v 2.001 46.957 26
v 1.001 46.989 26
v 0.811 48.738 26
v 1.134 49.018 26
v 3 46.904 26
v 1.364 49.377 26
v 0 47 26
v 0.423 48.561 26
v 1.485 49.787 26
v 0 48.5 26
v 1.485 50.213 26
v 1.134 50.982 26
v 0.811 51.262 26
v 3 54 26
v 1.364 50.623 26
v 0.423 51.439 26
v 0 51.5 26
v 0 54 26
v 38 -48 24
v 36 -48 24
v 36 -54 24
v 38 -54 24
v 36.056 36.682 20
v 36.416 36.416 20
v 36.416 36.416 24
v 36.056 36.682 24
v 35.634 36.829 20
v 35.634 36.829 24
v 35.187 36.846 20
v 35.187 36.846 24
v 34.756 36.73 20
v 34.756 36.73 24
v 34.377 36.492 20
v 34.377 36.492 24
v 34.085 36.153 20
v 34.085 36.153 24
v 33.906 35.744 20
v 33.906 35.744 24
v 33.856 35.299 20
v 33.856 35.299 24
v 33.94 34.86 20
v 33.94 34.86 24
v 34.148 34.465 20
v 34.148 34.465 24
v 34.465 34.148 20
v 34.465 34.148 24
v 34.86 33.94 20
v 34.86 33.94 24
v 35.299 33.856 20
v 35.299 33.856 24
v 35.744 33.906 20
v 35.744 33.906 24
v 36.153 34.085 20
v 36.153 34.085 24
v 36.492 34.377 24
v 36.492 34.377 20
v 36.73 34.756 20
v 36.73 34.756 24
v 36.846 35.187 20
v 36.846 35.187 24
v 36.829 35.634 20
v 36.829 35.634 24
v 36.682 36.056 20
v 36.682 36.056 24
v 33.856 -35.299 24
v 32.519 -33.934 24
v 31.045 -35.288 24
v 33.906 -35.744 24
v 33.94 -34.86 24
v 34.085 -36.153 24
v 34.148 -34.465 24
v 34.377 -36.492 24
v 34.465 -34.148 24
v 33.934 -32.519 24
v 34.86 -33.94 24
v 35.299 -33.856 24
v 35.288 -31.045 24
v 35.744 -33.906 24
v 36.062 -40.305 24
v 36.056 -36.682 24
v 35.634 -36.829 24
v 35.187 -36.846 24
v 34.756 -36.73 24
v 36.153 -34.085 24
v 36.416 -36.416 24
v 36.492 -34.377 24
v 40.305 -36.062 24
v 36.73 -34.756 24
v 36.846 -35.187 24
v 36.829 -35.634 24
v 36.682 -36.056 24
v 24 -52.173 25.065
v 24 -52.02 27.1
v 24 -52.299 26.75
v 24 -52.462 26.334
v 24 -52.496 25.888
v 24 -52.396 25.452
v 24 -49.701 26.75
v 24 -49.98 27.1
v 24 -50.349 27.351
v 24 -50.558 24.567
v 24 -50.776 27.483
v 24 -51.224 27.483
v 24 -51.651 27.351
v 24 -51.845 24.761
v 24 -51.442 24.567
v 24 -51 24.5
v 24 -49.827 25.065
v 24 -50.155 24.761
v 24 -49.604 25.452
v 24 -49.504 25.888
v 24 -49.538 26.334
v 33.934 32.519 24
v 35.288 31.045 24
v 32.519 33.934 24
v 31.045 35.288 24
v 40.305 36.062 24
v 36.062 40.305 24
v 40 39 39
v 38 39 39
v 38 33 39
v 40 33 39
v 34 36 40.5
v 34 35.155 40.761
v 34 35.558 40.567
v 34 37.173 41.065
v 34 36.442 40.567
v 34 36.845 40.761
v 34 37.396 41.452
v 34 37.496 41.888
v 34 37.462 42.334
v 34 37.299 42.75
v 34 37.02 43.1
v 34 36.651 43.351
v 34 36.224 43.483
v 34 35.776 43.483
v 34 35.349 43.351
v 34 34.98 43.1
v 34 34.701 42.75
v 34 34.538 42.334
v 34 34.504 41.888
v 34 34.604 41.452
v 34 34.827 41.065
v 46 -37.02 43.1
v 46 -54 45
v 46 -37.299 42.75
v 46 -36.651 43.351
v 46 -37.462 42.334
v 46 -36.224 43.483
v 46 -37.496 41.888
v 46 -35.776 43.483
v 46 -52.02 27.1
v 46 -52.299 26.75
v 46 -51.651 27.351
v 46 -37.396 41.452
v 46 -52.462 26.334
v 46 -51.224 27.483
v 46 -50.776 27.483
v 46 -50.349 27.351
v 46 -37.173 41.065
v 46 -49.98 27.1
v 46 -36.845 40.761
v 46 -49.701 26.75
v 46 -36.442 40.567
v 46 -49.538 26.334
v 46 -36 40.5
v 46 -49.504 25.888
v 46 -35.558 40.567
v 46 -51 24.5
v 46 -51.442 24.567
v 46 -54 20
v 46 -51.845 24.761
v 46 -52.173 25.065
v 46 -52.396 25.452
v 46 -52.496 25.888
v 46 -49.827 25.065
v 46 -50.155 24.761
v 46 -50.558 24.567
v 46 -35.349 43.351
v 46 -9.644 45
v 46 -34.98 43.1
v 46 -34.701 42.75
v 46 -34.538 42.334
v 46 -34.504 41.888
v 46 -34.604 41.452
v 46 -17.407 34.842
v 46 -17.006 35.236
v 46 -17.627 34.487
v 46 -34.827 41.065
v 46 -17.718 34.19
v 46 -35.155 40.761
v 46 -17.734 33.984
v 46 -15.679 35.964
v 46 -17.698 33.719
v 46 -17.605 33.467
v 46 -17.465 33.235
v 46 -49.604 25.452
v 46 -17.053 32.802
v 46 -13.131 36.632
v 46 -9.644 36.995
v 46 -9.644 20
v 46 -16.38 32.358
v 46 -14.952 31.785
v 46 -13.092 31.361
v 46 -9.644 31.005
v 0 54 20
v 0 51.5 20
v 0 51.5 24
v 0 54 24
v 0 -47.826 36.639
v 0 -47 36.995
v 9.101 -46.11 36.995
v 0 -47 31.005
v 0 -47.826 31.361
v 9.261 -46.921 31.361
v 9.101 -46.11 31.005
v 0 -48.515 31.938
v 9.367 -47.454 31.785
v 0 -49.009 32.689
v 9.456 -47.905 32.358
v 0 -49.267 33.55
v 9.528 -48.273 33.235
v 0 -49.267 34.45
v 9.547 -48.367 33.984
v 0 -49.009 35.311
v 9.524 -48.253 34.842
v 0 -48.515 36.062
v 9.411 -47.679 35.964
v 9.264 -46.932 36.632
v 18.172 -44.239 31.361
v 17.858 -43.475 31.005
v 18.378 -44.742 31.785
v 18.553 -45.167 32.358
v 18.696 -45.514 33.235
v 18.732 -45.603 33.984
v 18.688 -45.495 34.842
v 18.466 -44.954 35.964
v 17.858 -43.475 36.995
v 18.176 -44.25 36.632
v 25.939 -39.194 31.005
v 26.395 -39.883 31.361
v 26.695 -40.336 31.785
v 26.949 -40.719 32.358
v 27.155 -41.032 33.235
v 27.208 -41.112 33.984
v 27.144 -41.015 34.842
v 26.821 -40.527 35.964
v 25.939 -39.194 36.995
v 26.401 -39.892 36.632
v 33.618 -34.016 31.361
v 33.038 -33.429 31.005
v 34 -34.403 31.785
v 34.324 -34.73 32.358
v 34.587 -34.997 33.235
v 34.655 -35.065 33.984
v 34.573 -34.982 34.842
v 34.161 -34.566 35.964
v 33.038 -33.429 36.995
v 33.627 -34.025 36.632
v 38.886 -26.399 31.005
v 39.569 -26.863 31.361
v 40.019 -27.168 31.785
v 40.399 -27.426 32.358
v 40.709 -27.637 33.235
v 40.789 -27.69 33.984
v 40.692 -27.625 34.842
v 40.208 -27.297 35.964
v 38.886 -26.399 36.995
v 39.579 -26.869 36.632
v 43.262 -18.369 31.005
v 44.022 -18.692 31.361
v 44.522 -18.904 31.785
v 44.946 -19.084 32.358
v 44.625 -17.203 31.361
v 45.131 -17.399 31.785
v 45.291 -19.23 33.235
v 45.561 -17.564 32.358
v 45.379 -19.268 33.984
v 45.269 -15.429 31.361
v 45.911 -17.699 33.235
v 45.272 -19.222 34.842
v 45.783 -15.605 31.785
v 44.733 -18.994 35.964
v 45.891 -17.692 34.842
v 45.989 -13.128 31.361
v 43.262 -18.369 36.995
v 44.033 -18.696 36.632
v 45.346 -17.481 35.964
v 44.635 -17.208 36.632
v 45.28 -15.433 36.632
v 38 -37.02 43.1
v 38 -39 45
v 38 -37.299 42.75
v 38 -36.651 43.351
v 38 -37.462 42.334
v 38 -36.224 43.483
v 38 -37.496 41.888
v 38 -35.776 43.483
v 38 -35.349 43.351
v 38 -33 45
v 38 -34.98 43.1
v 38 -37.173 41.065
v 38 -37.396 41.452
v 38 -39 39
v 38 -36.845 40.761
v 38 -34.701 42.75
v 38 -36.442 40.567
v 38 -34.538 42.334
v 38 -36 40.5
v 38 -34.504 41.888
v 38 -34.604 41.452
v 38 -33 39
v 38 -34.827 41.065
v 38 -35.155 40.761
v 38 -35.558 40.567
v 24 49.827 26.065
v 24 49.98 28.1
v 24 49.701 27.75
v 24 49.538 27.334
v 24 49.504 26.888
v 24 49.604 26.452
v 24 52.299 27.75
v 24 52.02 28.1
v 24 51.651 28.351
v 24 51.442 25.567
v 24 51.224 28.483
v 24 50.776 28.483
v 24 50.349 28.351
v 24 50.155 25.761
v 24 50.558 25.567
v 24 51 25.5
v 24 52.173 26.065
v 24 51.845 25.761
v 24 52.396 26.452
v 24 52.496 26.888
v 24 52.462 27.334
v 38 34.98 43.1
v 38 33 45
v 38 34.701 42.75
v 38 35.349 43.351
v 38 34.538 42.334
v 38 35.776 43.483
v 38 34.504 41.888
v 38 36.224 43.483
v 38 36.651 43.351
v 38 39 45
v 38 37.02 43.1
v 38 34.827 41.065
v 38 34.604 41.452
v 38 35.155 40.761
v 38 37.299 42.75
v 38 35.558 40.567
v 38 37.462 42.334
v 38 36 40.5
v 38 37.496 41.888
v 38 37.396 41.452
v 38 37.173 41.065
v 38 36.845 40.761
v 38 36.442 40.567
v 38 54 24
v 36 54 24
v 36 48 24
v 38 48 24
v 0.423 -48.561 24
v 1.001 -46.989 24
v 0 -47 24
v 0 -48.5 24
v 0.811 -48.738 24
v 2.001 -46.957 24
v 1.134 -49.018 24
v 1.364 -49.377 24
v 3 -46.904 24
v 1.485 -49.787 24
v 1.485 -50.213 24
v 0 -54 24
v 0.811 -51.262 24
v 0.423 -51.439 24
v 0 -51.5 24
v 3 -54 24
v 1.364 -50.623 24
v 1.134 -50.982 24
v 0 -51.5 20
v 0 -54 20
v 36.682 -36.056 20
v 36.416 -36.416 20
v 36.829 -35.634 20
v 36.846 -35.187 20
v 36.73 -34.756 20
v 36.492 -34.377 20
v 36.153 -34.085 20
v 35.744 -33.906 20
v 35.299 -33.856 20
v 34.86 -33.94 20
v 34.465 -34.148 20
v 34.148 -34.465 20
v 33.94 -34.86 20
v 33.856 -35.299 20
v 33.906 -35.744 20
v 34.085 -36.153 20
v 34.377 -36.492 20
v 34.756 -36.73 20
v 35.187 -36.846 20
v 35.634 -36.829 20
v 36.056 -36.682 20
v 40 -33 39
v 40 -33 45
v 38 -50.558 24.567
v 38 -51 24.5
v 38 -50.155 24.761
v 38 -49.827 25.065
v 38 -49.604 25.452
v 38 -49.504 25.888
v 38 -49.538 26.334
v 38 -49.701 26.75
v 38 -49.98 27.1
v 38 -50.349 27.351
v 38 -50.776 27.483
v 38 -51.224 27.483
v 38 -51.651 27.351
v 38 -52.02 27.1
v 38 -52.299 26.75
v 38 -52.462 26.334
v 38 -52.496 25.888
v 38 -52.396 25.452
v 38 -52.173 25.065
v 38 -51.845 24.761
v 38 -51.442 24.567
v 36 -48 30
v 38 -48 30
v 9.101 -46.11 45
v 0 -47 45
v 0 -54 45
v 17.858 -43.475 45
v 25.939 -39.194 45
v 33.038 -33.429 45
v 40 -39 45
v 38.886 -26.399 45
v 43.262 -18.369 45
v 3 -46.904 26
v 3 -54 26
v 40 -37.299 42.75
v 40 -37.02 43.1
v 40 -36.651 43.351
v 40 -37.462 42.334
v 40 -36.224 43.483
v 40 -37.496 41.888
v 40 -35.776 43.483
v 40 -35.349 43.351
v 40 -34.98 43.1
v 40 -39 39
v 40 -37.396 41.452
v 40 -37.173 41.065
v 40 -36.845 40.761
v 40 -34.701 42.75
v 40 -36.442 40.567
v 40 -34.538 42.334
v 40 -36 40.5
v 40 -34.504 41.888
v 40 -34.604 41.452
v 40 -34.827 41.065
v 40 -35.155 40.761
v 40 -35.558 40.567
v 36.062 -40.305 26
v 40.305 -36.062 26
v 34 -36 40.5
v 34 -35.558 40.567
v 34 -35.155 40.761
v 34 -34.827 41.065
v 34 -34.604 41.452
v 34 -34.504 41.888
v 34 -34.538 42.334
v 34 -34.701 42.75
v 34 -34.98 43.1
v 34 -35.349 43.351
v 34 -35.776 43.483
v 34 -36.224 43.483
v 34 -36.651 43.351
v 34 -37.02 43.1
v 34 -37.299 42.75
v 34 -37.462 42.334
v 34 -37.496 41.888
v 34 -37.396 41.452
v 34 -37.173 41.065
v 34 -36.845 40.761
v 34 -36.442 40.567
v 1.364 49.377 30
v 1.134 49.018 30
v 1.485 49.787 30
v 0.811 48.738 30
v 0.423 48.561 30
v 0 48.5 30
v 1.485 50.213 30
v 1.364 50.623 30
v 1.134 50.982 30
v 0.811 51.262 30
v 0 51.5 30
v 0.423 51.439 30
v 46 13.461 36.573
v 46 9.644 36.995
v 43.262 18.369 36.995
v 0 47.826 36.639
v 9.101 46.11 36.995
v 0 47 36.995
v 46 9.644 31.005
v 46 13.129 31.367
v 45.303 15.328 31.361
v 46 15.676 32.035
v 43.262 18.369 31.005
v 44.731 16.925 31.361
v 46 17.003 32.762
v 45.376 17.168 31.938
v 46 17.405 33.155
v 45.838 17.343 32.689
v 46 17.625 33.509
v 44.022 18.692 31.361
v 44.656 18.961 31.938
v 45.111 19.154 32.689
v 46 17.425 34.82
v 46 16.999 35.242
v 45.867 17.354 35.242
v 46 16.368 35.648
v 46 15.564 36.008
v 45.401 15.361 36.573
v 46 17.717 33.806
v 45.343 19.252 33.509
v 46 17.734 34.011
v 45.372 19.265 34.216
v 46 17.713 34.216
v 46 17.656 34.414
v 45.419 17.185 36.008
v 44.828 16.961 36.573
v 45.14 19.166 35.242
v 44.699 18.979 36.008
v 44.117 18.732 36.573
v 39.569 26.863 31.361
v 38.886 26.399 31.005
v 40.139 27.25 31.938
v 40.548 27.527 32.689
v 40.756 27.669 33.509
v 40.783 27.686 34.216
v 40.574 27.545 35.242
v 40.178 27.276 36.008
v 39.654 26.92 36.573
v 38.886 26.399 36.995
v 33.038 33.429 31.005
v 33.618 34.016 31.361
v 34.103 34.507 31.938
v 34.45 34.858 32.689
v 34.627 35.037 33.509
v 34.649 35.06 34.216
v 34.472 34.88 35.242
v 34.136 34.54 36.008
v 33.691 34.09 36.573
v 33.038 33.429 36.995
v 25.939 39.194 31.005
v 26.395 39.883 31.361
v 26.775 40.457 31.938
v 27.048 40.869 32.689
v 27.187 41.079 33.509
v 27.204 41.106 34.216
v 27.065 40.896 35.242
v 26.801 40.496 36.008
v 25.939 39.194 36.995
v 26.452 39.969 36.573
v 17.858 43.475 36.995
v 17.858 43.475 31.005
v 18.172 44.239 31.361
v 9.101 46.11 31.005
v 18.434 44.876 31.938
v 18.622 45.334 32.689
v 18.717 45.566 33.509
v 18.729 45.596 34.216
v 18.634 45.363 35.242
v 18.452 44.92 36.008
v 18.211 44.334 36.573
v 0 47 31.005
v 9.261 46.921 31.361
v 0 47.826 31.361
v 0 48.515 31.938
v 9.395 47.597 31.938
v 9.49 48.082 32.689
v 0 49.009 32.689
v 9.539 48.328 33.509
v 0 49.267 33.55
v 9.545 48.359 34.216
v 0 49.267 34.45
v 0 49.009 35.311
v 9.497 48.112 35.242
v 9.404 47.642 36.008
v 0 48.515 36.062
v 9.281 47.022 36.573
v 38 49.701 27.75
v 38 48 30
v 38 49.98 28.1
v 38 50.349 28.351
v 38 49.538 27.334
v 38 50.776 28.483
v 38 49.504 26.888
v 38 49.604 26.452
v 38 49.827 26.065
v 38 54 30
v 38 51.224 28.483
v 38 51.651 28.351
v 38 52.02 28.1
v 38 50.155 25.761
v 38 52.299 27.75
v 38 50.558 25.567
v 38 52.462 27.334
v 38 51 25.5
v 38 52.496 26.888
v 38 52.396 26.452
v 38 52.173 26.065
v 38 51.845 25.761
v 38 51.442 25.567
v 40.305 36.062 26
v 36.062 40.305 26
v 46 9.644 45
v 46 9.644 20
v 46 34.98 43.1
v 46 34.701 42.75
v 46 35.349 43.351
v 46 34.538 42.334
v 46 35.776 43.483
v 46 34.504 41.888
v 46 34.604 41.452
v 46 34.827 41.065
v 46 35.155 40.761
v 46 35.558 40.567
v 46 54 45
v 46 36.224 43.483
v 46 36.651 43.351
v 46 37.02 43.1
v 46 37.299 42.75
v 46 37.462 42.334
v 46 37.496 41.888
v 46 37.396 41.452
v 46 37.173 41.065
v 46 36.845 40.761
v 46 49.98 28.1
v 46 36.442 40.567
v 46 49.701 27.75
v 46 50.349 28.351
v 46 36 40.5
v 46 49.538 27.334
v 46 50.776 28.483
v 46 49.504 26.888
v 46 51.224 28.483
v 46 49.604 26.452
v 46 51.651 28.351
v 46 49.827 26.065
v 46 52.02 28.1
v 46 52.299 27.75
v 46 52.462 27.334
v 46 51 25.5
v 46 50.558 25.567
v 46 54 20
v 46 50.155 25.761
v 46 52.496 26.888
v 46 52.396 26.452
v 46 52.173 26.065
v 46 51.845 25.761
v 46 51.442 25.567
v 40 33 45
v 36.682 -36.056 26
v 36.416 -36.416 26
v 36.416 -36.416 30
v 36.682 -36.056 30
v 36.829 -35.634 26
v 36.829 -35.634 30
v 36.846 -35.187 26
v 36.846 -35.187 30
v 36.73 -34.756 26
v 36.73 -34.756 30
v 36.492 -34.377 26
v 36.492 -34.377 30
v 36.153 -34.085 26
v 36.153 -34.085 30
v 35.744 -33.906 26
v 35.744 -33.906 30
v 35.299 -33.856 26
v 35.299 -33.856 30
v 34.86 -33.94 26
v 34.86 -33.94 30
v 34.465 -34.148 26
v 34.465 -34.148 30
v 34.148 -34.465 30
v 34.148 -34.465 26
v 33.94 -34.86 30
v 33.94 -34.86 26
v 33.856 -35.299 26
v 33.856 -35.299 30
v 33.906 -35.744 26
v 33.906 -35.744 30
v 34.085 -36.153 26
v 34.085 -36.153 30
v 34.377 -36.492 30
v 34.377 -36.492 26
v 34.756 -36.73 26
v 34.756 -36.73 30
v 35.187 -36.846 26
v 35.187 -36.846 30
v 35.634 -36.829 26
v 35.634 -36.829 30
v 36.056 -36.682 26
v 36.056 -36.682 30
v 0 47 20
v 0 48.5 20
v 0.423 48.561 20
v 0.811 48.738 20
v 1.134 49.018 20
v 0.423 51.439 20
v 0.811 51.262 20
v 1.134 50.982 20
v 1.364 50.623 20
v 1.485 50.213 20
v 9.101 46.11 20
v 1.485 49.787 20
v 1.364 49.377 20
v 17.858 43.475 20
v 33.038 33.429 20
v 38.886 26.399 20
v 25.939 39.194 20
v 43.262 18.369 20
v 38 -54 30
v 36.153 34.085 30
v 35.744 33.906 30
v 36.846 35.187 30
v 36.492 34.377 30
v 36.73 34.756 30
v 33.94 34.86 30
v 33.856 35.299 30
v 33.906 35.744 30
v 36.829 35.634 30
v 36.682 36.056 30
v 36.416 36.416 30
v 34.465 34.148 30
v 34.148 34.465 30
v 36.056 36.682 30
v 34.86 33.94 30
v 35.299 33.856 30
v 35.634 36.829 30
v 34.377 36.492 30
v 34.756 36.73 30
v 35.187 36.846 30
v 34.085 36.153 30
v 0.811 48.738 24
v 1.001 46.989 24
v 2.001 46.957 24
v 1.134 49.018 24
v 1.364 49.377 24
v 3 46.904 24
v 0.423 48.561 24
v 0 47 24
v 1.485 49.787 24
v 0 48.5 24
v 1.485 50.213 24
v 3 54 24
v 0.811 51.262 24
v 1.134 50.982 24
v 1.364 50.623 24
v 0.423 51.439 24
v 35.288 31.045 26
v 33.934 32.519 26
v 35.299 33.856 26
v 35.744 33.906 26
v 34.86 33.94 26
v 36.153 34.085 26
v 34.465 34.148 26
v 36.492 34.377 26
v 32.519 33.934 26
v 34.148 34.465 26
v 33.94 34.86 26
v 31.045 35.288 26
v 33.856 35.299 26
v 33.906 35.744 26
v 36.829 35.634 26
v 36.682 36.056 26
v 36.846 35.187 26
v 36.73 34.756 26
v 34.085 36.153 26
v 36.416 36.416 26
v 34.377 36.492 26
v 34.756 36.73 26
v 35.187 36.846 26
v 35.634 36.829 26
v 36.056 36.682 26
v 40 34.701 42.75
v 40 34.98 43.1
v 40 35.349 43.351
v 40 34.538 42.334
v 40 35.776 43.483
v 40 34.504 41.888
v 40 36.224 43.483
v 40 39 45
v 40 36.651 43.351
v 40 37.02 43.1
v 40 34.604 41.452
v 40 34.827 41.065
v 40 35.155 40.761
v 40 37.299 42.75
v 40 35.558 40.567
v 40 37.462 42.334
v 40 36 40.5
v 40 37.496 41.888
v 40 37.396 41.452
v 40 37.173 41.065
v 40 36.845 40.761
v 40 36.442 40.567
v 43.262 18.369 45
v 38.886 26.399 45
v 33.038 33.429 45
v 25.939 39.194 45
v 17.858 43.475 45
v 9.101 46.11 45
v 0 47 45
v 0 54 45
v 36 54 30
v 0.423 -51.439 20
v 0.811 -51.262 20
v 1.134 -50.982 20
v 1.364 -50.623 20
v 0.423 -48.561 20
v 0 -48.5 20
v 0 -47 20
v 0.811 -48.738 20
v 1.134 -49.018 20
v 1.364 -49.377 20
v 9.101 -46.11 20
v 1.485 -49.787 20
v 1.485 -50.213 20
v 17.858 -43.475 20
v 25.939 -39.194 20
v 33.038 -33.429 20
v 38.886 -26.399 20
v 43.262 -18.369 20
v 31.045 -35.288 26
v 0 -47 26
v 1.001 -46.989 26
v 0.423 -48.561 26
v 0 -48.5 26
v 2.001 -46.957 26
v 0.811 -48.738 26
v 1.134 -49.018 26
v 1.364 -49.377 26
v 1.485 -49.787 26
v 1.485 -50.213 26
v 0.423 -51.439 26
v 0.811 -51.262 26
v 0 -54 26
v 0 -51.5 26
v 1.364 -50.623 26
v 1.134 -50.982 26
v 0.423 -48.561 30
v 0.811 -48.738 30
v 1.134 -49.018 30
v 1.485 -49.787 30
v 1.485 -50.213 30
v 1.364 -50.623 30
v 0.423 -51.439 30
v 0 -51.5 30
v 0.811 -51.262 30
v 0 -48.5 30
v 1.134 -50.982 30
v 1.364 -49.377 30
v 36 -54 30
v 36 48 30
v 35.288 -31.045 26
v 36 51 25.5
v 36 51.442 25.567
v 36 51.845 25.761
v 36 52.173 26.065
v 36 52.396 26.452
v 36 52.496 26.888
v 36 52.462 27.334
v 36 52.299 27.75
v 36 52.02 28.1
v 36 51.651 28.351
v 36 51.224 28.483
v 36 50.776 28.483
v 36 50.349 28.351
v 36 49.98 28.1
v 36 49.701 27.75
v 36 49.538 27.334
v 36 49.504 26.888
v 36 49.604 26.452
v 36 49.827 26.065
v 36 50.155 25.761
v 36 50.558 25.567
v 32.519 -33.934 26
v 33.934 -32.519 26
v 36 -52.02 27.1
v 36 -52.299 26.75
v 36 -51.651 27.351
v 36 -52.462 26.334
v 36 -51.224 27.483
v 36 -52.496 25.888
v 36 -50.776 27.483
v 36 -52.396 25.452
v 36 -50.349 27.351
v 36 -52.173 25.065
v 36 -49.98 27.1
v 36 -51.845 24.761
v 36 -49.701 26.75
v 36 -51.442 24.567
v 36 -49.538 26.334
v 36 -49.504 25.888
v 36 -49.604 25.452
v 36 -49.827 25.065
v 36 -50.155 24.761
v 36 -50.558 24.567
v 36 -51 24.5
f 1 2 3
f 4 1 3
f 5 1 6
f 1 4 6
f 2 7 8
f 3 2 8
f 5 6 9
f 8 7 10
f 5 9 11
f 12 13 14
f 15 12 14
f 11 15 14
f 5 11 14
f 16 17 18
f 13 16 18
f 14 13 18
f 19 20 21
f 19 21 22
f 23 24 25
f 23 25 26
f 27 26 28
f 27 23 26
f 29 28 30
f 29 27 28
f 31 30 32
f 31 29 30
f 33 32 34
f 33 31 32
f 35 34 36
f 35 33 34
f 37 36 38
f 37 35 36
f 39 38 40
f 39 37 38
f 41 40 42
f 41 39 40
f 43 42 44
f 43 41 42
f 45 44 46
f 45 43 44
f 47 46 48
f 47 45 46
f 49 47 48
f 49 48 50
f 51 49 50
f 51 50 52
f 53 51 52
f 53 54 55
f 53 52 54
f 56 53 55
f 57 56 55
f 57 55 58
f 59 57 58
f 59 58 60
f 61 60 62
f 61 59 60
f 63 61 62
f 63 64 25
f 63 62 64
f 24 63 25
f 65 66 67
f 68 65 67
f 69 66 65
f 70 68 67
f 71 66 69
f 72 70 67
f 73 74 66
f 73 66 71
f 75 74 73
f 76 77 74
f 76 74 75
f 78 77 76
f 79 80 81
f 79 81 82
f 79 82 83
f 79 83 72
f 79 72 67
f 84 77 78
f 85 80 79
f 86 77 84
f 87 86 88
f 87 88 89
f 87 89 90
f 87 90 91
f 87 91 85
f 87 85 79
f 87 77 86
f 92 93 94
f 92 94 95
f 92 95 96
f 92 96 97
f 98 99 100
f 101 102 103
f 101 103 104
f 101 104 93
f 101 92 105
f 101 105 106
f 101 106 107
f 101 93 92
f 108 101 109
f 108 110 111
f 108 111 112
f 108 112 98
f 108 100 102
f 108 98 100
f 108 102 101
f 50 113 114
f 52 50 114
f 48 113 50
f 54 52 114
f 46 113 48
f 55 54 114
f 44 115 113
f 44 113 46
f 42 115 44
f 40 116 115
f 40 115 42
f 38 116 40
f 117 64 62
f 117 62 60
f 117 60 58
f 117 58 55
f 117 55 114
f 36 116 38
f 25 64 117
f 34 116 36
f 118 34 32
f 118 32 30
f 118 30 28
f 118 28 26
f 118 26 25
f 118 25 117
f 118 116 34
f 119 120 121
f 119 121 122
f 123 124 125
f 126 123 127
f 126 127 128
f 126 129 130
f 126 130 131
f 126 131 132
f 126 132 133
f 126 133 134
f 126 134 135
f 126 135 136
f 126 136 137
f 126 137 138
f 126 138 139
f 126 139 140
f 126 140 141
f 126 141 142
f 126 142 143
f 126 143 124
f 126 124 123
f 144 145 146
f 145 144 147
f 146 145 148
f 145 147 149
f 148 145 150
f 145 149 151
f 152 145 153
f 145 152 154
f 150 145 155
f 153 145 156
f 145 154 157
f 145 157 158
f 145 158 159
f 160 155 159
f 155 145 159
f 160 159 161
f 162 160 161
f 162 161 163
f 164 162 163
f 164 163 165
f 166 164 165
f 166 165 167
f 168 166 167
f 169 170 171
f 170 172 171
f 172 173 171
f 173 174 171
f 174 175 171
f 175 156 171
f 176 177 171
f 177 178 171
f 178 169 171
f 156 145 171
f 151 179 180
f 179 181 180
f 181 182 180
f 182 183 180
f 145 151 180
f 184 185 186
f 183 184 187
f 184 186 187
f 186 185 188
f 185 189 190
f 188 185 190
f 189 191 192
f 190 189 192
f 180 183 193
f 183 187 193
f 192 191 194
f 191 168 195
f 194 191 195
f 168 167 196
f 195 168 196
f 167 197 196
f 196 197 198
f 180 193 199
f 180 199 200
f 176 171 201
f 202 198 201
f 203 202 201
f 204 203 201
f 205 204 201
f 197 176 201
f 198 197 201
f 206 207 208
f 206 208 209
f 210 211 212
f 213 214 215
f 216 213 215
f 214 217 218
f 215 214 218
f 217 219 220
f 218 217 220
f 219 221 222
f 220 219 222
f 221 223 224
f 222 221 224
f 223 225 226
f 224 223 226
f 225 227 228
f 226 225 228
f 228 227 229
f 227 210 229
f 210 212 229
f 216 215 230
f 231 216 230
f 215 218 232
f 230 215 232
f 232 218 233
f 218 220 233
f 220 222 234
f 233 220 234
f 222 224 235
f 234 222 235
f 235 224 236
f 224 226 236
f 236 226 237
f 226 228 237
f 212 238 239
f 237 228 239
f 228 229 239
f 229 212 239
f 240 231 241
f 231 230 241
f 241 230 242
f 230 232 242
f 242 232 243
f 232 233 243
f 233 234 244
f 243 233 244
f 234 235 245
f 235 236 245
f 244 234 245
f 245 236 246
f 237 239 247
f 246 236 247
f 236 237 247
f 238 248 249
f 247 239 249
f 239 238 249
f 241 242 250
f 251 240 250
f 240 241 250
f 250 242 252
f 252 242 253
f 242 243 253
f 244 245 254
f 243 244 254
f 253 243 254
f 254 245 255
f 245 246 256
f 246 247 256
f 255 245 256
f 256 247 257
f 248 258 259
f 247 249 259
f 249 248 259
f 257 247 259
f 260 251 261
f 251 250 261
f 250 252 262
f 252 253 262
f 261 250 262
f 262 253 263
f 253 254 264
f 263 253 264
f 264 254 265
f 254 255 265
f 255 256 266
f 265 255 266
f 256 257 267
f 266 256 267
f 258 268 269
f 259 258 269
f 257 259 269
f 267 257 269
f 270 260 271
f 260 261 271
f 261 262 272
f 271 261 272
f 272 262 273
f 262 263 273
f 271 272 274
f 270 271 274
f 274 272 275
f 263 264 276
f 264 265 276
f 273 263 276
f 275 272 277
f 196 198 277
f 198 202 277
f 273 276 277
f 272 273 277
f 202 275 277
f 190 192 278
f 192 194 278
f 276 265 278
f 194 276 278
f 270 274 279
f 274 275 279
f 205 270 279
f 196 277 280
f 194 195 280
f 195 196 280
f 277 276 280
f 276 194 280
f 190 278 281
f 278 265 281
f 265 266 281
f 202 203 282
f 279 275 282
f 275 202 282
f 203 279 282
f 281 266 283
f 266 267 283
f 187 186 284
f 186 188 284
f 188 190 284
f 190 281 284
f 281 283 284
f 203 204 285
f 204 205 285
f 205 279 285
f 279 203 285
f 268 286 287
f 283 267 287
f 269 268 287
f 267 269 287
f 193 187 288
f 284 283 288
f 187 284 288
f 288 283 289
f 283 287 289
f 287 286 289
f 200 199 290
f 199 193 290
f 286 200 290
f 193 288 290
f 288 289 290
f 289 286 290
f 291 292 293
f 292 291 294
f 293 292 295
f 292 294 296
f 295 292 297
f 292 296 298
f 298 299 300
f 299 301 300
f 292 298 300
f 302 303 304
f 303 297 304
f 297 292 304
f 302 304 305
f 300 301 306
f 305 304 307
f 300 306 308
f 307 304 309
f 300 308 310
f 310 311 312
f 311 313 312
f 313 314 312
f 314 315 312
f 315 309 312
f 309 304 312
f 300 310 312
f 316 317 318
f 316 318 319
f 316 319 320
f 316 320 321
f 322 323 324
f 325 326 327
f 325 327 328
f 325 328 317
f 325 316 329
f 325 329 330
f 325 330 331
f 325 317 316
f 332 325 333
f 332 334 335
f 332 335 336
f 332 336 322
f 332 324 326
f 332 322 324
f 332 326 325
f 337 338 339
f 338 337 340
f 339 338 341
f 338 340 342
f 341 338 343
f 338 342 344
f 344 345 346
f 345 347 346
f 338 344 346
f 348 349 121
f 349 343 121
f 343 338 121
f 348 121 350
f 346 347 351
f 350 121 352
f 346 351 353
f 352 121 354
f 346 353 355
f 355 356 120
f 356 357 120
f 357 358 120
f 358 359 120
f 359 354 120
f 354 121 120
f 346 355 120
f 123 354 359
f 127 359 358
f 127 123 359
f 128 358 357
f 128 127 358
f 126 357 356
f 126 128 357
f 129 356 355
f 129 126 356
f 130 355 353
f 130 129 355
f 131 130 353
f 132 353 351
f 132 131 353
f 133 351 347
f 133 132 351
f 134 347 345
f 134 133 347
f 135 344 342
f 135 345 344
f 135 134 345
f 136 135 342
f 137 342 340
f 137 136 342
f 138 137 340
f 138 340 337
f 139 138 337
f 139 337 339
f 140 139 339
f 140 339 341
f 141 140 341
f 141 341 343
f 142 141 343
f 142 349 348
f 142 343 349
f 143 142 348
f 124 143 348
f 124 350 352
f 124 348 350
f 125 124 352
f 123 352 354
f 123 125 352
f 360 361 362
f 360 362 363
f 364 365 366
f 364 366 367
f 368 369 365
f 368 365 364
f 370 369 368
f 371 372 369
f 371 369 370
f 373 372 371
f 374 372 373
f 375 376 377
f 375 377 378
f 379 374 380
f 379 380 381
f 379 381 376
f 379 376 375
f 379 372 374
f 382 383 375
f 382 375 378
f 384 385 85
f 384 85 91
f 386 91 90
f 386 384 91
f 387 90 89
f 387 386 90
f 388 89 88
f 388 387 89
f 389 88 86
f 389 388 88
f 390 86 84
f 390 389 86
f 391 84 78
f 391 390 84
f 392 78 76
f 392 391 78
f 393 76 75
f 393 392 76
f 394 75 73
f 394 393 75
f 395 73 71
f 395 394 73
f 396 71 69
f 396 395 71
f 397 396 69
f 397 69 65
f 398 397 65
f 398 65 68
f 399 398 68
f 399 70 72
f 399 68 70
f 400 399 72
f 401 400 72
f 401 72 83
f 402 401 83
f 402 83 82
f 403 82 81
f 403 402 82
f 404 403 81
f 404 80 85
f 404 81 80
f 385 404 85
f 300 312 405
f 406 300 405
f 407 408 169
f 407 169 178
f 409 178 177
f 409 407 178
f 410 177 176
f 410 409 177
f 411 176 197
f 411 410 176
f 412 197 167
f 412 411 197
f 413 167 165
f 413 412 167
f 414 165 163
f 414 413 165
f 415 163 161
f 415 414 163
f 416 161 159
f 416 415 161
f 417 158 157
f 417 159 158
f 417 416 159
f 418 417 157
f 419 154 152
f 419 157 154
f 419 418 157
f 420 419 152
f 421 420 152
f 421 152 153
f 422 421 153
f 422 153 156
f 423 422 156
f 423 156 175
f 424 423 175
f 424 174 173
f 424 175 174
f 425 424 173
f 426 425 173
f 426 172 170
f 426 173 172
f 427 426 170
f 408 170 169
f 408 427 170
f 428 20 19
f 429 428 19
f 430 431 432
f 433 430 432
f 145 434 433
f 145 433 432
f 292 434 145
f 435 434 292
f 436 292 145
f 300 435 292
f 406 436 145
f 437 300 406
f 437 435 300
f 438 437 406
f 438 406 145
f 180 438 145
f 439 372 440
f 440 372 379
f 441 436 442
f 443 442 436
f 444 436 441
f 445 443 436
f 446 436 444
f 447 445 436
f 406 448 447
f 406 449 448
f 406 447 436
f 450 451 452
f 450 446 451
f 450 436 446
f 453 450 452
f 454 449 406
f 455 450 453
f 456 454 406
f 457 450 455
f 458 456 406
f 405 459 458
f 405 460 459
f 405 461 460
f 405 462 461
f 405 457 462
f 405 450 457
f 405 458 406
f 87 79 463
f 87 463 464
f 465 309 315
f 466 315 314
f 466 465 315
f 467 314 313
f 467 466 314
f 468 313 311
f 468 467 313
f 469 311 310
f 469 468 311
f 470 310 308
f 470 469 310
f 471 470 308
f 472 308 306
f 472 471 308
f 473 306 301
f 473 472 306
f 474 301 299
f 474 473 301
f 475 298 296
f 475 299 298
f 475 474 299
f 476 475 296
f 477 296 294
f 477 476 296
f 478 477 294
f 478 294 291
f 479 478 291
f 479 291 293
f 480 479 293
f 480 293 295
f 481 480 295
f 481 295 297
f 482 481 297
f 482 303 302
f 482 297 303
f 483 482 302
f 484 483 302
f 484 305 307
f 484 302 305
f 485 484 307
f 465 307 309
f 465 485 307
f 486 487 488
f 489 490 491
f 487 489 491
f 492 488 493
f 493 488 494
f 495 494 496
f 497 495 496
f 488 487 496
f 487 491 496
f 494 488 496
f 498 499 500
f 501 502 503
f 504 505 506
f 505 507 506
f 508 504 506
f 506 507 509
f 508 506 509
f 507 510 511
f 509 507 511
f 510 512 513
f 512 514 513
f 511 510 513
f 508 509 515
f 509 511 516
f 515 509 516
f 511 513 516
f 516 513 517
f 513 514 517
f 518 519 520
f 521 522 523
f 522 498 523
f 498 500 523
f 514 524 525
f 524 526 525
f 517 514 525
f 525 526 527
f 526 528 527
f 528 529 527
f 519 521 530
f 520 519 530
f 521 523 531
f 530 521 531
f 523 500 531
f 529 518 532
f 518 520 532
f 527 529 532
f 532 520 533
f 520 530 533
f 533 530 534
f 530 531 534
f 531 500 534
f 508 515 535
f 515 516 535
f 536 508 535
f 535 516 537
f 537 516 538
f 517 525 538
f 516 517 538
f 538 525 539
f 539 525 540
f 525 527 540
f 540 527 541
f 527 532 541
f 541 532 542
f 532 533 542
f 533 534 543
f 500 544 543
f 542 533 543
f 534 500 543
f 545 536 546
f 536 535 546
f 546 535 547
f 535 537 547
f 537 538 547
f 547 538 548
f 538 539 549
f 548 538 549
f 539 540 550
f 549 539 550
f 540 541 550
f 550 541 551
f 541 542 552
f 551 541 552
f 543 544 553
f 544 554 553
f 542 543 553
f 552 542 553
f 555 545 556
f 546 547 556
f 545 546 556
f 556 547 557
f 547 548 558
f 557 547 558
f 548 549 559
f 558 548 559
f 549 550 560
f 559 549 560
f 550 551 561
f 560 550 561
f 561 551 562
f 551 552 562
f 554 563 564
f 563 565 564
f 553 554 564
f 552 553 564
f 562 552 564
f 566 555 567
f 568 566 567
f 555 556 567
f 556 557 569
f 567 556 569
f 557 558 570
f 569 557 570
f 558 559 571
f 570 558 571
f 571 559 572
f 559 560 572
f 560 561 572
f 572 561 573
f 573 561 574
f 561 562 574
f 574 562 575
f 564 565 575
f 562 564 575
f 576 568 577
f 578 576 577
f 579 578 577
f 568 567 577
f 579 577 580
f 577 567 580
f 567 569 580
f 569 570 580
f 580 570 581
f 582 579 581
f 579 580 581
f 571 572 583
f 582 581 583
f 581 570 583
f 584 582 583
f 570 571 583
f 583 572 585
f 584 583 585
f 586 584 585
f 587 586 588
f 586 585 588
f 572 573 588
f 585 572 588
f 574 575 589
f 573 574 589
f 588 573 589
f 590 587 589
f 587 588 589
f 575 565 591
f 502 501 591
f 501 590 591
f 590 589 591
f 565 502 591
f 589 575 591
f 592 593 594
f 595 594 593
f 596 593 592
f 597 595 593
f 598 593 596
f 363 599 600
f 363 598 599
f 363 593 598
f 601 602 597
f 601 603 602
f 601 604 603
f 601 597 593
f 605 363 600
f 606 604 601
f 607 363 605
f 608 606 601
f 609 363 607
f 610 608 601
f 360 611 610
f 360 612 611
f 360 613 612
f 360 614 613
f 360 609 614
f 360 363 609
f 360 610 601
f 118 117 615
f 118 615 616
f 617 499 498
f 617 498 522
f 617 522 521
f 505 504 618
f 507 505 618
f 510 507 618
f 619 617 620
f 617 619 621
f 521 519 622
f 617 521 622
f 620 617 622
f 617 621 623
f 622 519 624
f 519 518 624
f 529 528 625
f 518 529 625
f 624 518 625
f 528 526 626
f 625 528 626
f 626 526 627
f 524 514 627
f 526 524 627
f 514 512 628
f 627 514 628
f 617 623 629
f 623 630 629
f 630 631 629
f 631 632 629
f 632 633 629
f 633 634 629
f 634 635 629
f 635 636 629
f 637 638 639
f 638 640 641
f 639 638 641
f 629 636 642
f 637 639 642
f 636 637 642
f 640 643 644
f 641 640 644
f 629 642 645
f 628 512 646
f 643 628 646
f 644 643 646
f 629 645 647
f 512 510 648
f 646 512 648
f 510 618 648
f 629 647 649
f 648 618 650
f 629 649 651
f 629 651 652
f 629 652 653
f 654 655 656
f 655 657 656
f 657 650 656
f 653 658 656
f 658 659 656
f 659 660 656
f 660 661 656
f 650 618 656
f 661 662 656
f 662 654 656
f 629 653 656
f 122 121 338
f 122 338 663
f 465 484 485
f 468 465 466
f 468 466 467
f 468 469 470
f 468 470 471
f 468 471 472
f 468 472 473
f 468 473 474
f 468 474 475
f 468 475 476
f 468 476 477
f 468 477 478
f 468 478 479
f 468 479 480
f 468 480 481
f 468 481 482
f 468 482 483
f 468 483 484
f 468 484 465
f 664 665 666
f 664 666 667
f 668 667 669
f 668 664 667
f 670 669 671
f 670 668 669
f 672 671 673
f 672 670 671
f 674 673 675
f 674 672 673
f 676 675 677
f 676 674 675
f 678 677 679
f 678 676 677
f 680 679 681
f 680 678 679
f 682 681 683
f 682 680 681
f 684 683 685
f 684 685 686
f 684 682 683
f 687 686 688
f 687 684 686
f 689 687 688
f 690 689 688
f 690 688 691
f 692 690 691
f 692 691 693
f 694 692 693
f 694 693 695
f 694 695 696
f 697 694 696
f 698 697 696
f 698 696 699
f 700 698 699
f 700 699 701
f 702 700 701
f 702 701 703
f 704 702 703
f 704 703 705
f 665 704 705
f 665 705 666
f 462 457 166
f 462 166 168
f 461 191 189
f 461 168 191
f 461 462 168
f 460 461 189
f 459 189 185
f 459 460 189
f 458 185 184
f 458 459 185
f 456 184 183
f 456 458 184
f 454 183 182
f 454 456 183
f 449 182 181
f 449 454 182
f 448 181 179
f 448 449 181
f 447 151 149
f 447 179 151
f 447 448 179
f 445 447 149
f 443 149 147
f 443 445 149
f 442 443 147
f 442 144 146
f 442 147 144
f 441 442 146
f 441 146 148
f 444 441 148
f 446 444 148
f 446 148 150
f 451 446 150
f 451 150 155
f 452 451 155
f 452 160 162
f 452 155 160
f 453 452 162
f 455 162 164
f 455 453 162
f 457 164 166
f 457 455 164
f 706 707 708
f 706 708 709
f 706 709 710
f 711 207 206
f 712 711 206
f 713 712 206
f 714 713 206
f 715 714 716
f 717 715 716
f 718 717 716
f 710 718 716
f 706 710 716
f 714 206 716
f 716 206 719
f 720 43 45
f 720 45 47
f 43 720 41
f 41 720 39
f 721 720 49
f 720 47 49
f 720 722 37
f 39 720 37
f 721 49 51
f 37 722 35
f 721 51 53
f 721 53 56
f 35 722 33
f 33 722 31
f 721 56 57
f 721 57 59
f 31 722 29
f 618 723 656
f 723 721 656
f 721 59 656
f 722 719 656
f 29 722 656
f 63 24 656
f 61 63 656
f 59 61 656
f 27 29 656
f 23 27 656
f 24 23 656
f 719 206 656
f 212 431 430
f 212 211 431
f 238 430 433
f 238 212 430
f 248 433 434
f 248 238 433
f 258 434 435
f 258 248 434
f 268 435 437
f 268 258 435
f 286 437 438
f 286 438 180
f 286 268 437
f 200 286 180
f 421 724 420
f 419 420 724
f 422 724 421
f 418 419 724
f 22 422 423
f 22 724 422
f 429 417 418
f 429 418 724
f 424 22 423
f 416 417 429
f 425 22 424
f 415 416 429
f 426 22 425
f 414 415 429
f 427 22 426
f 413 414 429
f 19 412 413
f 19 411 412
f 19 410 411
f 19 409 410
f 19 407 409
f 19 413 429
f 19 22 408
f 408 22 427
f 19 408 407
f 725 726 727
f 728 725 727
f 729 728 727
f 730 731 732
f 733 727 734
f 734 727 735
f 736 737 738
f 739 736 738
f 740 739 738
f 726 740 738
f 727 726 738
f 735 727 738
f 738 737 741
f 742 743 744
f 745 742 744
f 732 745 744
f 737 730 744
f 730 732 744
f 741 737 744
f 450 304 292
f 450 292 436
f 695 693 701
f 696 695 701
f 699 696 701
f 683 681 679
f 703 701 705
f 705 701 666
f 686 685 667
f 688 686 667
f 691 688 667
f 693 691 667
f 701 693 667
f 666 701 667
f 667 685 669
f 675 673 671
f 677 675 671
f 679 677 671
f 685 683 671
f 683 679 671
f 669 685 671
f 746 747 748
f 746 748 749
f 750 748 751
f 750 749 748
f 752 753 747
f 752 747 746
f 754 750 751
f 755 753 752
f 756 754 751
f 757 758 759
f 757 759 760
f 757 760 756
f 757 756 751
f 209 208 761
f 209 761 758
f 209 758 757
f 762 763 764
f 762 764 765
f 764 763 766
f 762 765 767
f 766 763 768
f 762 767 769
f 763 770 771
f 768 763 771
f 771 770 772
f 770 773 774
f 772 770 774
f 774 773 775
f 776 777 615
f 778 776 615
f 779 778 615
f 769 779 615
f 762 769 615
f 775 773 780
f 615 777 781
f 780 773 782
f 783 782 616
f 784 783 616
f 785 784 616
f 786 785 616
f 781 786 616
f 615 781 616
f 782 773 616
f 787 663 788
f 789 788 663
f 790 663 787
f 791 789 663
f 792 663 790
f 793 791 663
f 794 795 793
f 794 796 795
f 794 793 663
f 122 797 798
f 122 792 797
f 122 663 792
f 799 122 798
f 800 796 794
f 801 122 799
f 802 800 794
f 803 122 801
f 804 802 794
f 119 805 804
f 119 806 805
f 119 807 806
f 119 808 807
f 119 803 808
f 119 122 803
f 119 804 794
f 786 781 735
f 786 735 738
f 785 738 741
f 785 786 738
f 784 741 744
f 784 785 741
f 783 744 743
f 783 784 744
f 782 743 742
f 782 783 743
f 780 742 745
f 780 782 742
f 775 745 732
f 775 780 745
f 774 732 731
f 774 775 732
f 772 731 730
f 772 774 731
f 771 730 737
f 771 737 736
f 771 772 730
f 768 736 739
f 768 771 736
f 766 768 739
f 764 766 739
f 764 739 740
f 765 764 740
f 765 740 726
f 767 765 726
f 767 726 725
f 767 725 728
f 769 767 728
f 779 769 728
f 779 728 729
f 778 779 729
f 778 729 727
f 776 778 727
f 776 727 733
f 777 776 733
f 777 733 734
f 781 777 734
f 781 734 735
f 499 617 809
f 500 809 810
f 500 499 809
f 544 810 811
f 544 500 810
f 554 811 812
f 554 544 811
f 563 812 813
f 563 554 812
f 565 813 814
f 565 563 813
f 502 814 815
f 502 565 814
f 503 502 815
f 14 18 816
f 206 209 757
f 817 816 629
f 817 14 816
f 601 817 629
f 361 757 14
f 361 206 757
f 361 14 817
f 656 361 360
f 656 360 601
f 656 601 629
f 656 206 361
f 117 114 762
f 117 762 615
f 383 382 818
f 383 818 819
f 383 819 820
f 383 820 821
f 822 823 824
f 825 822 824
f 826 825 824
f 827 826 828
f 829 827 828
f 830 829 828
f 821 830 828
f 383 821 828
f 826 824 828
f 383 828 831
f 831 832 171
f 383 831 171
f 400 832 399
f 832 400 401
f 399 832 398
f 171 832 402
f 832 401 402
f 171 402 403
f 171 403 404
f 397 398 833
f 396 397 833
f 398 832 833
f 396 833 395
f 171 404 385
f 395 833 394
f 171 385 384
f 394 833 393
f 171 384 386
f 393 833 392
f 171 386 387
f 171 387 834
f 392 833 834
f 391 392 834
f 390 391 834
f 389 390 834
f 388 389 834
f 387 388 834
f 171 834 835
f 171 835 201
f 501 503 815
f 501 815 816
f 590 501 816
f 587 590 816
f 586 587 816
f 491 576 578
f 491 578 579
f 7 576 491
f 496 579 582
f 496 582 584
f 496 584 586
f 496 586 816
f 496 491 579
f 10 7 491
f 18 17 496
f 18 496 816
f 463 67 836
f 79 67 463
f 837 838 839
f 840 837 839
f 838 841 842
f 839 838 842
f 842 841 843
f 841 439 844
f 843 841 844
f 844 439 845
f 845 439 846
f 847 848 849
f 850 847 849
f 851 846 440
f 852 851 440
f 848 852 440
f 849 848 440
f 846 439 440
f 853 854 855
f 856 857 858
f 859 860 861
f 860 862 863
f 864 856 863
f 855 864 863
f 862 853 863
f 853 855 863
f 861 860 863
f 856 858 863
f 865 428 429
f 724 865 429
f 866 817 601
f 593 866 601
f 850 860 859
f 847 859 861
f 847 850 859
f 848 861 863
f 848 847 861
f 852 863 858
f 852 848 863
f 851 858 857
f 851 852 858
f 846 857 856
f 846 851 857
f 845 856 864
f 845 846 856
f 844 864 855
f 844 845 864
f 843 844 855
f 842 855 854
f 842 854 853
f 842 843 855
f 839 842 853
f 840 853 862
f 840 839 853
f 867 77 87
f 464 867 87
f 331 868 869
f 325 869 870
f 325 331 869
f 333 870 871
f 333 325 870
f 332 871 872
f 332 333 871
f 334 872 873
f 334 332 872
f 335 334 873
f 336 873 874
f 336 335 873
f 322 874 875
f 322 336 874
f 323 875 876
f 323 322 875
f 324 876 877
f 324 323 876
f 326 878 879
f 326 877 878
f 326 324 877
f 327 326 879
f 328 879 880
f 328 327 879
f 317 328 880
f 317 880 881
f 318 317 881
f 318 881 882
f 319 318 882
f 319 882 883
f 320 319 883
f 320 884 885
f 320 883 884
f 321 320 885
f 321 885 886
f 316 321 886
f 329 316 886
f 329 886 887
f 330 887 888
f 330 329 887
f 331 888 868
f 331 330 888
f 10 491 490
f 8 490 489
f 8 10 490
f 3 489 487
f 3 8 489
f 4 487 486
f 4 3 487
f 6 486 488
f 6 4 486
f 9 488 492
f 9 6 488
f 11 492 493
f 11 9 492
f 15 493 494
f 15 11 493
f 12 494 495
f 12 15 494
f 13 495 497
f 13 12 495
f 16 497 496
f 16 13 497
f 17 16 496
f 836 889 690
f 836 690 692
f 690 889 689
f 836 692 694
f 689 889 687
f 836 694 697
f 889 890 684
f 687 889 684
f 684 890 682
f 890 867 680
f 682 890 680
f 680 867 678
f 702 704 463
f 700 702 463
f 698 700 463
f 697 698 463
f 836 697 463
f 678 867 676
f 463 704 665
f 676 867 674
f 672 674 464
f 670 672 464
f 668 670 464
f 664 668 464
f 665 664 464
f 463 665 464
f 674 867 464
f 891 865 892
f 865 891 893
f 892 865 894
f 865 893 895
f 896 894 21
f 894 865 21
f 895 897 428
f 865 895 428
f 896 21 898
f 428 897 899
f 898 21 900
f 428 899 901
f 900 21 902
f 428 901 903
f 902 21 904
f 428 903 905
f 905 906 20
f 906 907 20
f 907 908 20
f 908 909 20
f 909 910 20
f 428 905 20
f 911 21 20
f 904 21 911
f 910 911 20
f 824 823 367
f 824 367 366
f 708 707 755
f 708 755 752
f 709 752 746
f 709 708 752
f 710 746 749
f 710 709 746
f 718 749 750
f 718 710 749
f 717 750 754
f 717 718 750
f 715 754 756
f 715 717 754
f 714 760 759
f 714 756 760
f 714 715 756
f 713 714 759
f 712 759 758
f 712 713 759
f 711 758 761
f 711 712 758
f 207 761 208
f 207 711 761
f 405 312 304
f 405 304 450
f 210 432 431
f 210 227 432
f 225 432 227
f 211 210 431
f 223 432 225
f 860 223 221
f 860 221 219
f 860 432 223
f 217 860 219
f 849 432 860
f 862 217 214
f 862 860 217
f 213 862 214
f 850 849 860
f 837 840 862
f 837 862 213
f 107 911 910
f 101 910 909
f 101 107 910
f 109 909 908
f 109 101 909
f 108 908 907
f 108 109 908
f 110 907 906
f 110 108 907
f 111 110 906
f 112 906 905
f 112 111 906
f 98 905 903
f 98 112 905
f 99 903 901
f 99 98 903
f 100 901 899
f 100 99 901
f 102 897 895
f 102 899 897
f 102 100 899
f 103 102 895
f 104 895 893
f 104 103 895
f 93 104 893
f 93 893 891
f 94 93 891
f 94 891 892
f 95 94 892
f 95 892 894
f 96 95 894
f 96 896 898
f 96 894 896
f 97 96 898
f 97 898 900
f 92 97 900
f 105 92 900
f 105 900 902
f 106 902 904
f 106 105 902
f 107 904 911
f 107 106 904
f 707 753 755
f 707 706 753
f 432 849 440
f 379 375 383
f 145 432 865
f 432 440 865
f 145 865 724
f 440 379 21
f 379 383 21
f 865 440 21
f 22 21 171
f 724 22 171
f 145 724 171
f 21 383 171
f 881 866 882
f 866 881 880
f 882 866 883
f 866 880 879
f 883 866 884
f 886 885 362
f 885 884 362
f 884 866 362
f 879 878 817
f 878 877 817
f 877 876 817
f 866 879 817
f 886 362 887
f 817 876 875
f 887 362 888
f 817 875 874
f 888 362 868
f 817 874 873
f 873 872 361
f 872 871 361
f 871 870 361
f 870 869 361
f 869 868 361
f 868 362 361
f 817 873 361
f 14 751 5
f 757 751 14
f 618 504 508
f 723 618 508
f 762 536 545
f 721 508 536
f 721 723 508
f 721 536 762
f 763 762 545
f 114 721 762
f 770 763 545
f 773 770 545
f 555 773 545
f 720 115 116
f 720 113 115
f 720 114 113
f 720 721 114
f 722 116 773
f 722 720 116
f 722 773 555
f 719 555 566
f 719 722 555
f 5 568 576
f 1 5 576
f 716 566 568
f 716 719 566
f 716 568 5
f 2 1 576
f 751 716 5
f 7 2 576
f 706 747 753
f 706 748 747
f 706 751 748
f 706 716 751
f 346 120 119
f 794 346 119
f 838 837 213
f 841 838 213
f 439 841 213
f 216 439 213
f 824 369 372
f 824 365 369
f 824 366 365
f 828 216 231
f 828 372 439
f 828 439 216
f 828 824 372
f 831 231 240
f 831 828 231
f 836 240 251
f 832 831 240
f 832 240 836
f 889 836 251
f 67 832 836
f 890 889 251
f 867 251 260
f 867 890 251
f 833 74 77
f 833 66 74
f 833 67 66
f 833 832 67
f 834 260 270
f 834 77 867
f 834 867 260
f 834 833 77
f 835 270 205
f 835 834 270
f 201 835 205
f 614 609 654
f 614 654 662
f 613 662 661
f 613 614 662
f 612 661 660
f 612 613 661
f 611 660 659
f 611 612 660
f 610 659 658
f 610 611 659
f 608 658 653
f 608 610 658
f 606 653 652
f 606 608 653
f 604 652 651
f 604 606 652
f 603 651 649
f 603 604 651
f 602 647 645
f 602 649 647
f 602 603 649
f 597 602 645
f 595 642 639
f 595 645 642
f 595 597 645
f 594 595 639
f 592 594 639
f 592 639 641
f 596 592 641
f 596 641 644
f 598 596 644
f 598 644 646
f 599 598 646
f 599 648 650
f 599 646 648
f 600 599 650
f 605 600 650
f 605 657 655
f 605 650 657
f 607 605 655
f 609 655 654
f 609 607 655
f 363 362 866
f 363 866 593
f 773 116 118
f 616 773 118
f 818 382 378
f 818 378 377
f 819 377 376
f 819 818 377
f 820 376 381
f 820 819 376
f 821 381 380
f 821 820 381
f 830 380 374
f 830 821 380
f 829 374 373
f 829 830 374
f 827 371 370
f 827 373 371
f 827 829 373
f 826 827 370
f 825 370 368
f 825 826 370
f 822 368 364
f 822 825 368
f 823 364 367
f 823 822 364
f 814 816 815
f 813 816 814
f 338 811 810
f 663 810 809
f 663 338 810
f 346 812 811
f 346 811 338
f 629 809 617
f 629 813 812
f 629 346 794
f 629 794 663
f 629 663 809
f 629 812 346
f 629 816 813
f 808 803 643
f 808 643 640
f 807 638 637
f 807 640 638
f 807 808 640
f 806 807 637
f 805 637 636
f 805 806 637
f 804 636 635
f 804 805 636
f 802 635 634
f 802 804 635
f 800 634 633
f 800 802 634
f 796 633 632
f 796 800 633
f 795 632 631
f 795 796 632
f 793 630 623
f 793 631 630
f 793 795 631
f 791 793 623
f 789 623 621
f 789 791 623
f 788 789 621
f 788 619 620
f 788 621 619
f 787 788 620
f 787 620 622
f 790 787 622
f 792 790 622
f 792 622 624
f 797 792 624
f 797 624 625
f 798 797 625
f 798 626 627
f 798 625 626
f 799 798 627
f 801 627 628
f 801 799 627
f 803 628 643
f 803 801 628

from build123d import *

# Parameters (mm, degrees)
BOX178_W                    = 2
BOX178_H                    = 6
BOX178_DEPTH                = 6
BOX179_W                    = 2
BOX179_H                    = 6
BOX179_DEPTH                = 6
BOX180_W                    = 2
BOX180_H                    = 6
BOX180_DEPTH                = 6
BOX177_W                    = 2
BOX177_H                    = 6
BOX177_DEPTH                = 6
CYLINDER392_R               = 1.5
CYLINDER392_DEPTH           = 100
CYLINDER393_R               = 1.5
CYLINDER393_DEPTH           = 100
CYLINDER394_R               = 1.5
CYLINDER394_DEPTH           = 100
CYLINDER391_R               = 1.5
CYLINDER391_DEPTH           = 100
BOX171_W                    = 8
BOX171_H                    = 6
BOX171_DEPTH                = 2
BOX171_PLACEMENT_ANGLE      = 45
BOX165_W                    = 8
BOX165_H                    = 6
BOX165_DEPTH                = 2
BOX166_W                    = 8
BOX166_H                    = 6
BOX166_DEPTH                = 2
BOX166_PLACEMENT_ANGLE      = 135
BOX168_W                    = 8
BOX168_H                    = 6
BOX168_DEPTH                = 2
BOX169_W                    = 8
BOX169_H                    = 6
BOX169_DEPTH                = 2
BOX169_PLACEMENT_ANGLE      = 225
BOX172_W                    = 8
BOX172_H                    = 6
BOX172_DEPTH                = 2
BOX170_W                    = 8
BOX170_H                    = 6
BOX170_DEPTH                = 2
BOX170_PLACEMENT_ANGLE      = 45
BOX167_W                    = 8
BOX167_H                    = 6
BOX167_DEPTH                = 2
CYLINDER375_R               = 1.5
CYLINDER375_DEPTH           = 50
CYLINDER375_PLACEMENT_ANGLE = 45
CYLINDER376_R               = 1.5
CYLINDER376_DEPTH           = 50
CYLINDER377_R               = 1.5
CYLINDER377_DEPTH           = 50
CYLINDER377_PLACEMENT_ANGLE = 135
CYLINDER378_R               = 1.5
CYLINDER378_DEPTH           = 50
CYLINDER379_R               = 1.5
CYLINDER379_DEPTH           = 50
CYLINDER379_PLACEMENT_ANGLE = 225
CYLINDER380_R               = 1.5
CYLINDER380_DEPTH           = 50
CYLINDER381_R               = 1.5
CYLINDER381_DEPTH           = 50
CYLINDER381_PLACEMENT_ANGLE = 45
CYLINDER374_R               = 1.5
CYLINDER374_DEPTH           = 50
TORUS005_R                  = 3.1
CYLINDER_R                  = 47
CYLINDER_DEPTH              = 25
BOX156_W                    = 46
BOX156_H                    = 108
BOX156_DEPTH                = 25


with BuildPart() as krychle178:
    # Box178 → Box178 (new body)
    with BuildSketch(Plane(origin=(36, -54, 24), x_dir=(1, 0, 0), z_dir=(0, 0, 1))):
        with Locations((1, 3)):
            Rectangle(BOX178_W, BOX178_H)
    extrude(amount=BOX178_DEPTH)


with BuildPart() as krychle179:
    # Box179 → Box179 (new body)
    with BuildSketch(Plane(origin=(38, 33, 39), x_dir=(1, 0, 0), z_dir=(0, 0, 1))):
        with Locations((1, 3)):
            Rectangle(BOX179_W, BOX179_H)
    extrude(amount=BOX179_DEPTH)


with BuildPart() as krychle180:
    # Box180 → Box180 (new body)
    with BuildSketch(Plane(origin=(38, -39, 39), x_dir=(1, 0, 0), z_dir=(0, 0, 1))):
        with Locations((1, 3)):
            Rectangle(BOX180_W, BOX180_H)
    extrude(amount=BOX180_DEPTH)


with BuildPart() as compound304:
    # Box177 → Box177 (new body)
    with BuildSketch(Plane(origin=(36, 48, 24), x_dir=(1, 0, 0), z_dir=(0, 0, 1))):
        with Locations((1, 3)):
            Rectangle(BOX177_W, BOX177_H)
    extrude(amount=BOX177_DEPTH)

    # Compound304: union Krychle178, Krychle179, Krychle180
    add(krychle178.part)
    add(krychle179.part)
    add(krychle180.part)


with BuildPart() as v_lec392:
    # Cylinder392 → Cylinder392 (new body)
    with BuildSketch(Plane(origin=(24, -51, 26), x_dir=(0, 0, -1), z_dir=(1, 0, 0))):
        Circle(CYLINDER392_R)
    extrude(amount=CYLINDER392_DEPTH)


with BuildPart() as v_lec393:
    # Cylinder393 → Cylinder393 (new body)
    with BuildSketch(Plane(origin=(34, 36, 42), x_dir=(0, 0, -1), z_dir=(1, 0, 0))):
        Circle(CYLINDER393_R)
    extrude(amount=CYLINDER393_DEPTH)


with BuildPart() as v_lec394:
    # Cylinder394 → Cylinder394 (new body)
    with BuildSketch(Plane(origin=(34, -36, 42), x_dir=(0, 0, -1), z_dir=(1, 0, 0))):
        Circle(CYLINDER394_R)
    extrude(amount=CYLINDER394_DEPTH)


with BuildPart() as compound301:
    # Cylinder391 → Cylinder391 (new body)
    with BuildSketch(Plane(origin=(24, 51, 27), x_dir=(0, 0, -1), z_dir=(1, 0, 0))):
        Circle(CYLINDER391_R)
    extrude(amount=CYLINDER391_DEPTH)

    # Compound301: union Válec392, Válec393, Válec394
    add(v_lec392.part)
    add(v_lec393.part)
    add(v_lec394.part)


with BuildPart() as krychle171:
    # Box171 → Box171 (new body)
    with BuildSketch(Plane.XY):
        with Locations((4, 3)):
            Rectangle(BOX171_W, BOX171_H)
    extrude(amount=BOX171_DEPTH)


with BuildPart() as krychle171_1:
    # Box171 placement: moved
    add(krychle171.part.moved(Location((34.648232, 30.405592, 23))).rotate(Axis((34.648232, 30.405592, 23), (0, 0, 1)), BOX171_PLACEMENT_ANGLE))


with BuildPart() as krychle165:
    # Box165 → Box165 (new body)
    with BuildSketch(Plane(origin=(3, 46, 23), x_dir=(0, 1, 0), z_dir=(0, 0, 1))):
        with Locations((4, 3)):
            Rectangle(BOX165_W, BOX165_H)
    extrude(amount=BOX165_DEPTH)


with BuildPart() as krychle166:
    # Box166 → Box166 (new body)
    with BuildSketch(Plane.XY):
        with Locations((4, 3)):
            Rectangle(BOX166_W, BOX166_H)
    extrude(amount=BOX166_DEPTH)


with BuildPart() as krychle166_1:
    # Box166 placement: moved
    add(krychle166.part.moved(Location((-30.405592, 34.648232, 23))).rotate(Axis((-30.405592, 34.648232, 23), (0, 0, 1)), BOX166_PLACEMENT_ANGLE))


with BuildPart() as krychle168:
    # Box168 → Box168 (new body)
    with BuildSketch(Plane(origin=(-46, 3, 23), x_dir=(-1, 0, 0), z_dir=(0, 0, 1))):
        with Locations((4, 3)):
            Rectangle(BOX168_W, BOX168_H)
    extrude(amount=BOX168_DEPTH)


with BuildPart() as krychle169:
    # Box169 → Box169 (new body)
    with BuildSketch(Plane.XY):
        with Locations((4, 3)):
            Rectangle(BOX169_W, BOX169_H)
    extrude(amount=BOX169_DEPTH)


with BuildPart() as krychle169_1:
    # Box169 placement: moved
    add(krychle169.part.moved(Location((-34.648232, -30.405592, 23))).rotate(Axis((-34.648232, -30.405592, 23), (0, 0, 1)), BOX169_PLACEMENT_ANGLE))


with BuildPart() as krychle172:
    # Box172 → Box172 (new body)
    with BuildSketch(Plane(origin=(-3, -46, 23), x_dir=(0, -1, 0), z_dir=(0, 0, 1))):
        with Locations((4, 3)):
            Rectangle(BOX172_W, BOX172_H)
    extrude(amount=BOX172_DEPTH)


with BuildPart() as krychle170:
    # Box170 → Box170 (new body)
    with BuildSketch(Plane.XY):
        with Locations((4, 3)):
            Rectangle(BOX170_W, BOX170_H)
    extrude(amount=BOX170_DEPTH)


with BuildPart() as krychle170_1:
    # Box170 placement: moved
    add(krychle170.part.moved(Location((30.405592, -34.648232, 23))).rotate(Axis((30.405592, -34.648232, 23), (0, 0, -1)), BOX170_PLACEMENT_ANGLE))


with BuildPart() as compound300:
    # Box167 → Box167 (new body)
    with BuildSketch(Plane(origin=(46, -3, 23), x_dir=(1, 0, 0), z_dir=(0, 0, 1))):
        with Locations((4, 3)):
            Rectangle(BOX167_W, BOX167_H)
    extrude(amount=BOX167_DEPTH)

    # Compound300: union Krychle171, Krychle165, Krychle166, Krychle168, Krychle169, Krychle172, Krychle170
    add(krychle171_1.part)
    add(krychle165.part)
    add(krychle166_1.part)
    add(krychle168.part)
    add(krychle169_1.part)
    add(krychle172.part)
    add(krychle170_1.part)


with BuildPart() as compound300_1:
    # Compound300 placement: moved
    add(compound300.part.moved(Location((0, 0, 1))))


with BuildPart() as v_lec375:
    # Cylinder375 → Cylinder375 (new body)
    with BuildSketch(Plane.XY):
        Circle(CYLINDER375_R)
    extrude(amount=CYLINDER375_DEPTH)


with BuildPart() as v_lec375_1:
    # Cylinder375 placement: moved
    add(v_lec375.part.moved(Location((35.355339, 35.355339, -15))).rotate(Axis((35.355339, 35.355339, -15), (0, 0, 1)), CYLINDER375_PLACEMENT_ANGLE))


with BuildPart() as v_lec376:
    # Cylinder376 → Cylinder376 (new body)
    with BuildSketch(Plane(origin=(0, 50, -15), x_dir=(0, 1, 0), z_dir=(0, 0, 1))):
        Circle(CYLINDER376_R)
    extrude(amount=CYLINDER376_DEPTH)


with BuildPart() as v_lec377:
    # Cylinder377 → Cylinder377 (new body)
    with BuildSketch(Plane.XY):
        Circle(CYLINDER377_R)
    extrude(amount=CYLINDER377_DEPTH)


with BuildPart() as v_lec377_1:
    # Cylinder377 placement: moved
    add(v_lec377.part.moved(Location((-35.355339, 35.355339, -15))).rotate(Axis((-35.355339, 35.355339, -15), (0, 0, 1)), CYLINDER377_PLACEMENT_ANGLE))


with BuildPart() as v_lec378:
    # Cylinder378 → Cylinder378 (new body)
    with BuildSketch(Plane(origin=(-50, 0, -15), x_dir=(-1, 0, 0), z_dir=(0, 0, 1))):
        Circle(CYLINDER378_R)
    extrude(amount=CYLINDER378_DEPTH)


with BuildPart() as v_lec379:
    # Cylinder379 → Cylinder379 (new body)
    with BuildSketch(Plane.XY):
        Circle(CYLINDER379_R)
    extrude(amount=CYLINDER379_DEPTH)


with BuildPart() as v_lec379_1:
    # Cylinder379 placement: moved
    add(v_lec379.part.moved(Location((-35.355339, -35.355339, -15))).rotate(Axis((-35.355339, -35.355339, -15), (0, 0, 1)), CYLINDER379_PLACEMENT_ANGLE))


with BuildPart() as v_lec380:
    # Cylinder380 → Cylinder380 (new body)
    with BuildSketch(Plane(origin=(0, -50, -15), x_dir=(0, -1, 0), z_dir=(0, 0, 1))):
        Circle(CYLINDER380_R)
    extrude(amount=CYLINDER380_DEPTH)


with BuildPart() as v_lec381:
    # Cylinder381 → Cylinder381 (new body)
    with BuildSketch(Plane.XY):
        Circle(CYLINDER381_R)
    extrude(amount=CYLINDER381_DEPTH)


with BuildPart() as v_lec381_1:
    # Cylinder381 placement: moved
    add(v_lec381.part.moved(Location((35.355339, -35.355339, -15))).rotate(Axis((35.355339, -35.355339, -15), (0, 0, -1)), CYLINDER381_PLACEMENT_ANGLE))


with BuildPart() as compound298:
    # Cylinder374 → Cylinder374 (new body)
    with BuildSketch(Plane(origin=(50, 0, -15), x_dir=(1, 0, 0), z_dir=(0, 0, 1))):
        Circle(CYLINDER374_R)
    extrude(amount=CYLINDER374_DEPTH)

    # Compound298: union Válec375, Válec376, Válec377, Válec378, Válec379, Válec380, Válec381
    add(v_lec375_1.part)
    add(v_lec376.part)
    add(v_lec377_1.part)
    add(v_lec378.part)
    add(v_lec379_1.part)
    add(v_lec380.part)
    add(v_lec381_1.part)


with BuildPart() as compound298_1:
    # Compound298 placement: moved
    add(compound298.part.moved(Location((0, 0, -5))))


with BuildPart() as anuloid005:
    # Torus005 → Torus005 (revolve)
    with BuildSketch(Plane(origin=(0, 0, 34), x_dir=(1, 0, 0), z_dir=(0, -1, 0))):
        with Locations((46.2, 0)):
            Circle(TORUS005_R)
    revolve(axis=Axis((0, 0, 34), (0, 0, 1)))


with BuildPart() as v_lec:
    # Cylinder → Cylinder (new body)
    with BuildSketch(Plane.XY.offset(20)):
        Circle(CYLINDER_R)
    extrude(amount=CYLINDER_DEPTH)


with BuildPart() as cut158:
    # Box156 → Box156 (new body)
    with BuildSketch(Plane(origin=(0, -54, 20), x_dir=(1, 0, 0), z_dir=(0, 0, 1))):
        with Locations((23, 54)):
            Rectangle(BOX156_W, BOX156_H)
    extrude(amount=BOX156_DEPTH)

    # Cut153: cut Válec
    add(v_lec.part, mode=Mode.SUBTRACT)

    # Cut154: cut Anuloid005
    add(anuloid005.part, mode=Mode.SUBTRACT)

    # Cut155: cut Compound298
    add(compound298_1.part, mode=Mode.SUBTRACT)

    # Cut156: cut Compound300
    add(compound300_1.part, mode=Mode.SUBTRACT)

    # Cut157: cut Compound301
    add(compound301.part, mode=Mode.SUBTRACT)

    # Cut158: cut Compound304
    add(compound304.part, mode=Mode.SUBTRACT)


solid = cut158.part
